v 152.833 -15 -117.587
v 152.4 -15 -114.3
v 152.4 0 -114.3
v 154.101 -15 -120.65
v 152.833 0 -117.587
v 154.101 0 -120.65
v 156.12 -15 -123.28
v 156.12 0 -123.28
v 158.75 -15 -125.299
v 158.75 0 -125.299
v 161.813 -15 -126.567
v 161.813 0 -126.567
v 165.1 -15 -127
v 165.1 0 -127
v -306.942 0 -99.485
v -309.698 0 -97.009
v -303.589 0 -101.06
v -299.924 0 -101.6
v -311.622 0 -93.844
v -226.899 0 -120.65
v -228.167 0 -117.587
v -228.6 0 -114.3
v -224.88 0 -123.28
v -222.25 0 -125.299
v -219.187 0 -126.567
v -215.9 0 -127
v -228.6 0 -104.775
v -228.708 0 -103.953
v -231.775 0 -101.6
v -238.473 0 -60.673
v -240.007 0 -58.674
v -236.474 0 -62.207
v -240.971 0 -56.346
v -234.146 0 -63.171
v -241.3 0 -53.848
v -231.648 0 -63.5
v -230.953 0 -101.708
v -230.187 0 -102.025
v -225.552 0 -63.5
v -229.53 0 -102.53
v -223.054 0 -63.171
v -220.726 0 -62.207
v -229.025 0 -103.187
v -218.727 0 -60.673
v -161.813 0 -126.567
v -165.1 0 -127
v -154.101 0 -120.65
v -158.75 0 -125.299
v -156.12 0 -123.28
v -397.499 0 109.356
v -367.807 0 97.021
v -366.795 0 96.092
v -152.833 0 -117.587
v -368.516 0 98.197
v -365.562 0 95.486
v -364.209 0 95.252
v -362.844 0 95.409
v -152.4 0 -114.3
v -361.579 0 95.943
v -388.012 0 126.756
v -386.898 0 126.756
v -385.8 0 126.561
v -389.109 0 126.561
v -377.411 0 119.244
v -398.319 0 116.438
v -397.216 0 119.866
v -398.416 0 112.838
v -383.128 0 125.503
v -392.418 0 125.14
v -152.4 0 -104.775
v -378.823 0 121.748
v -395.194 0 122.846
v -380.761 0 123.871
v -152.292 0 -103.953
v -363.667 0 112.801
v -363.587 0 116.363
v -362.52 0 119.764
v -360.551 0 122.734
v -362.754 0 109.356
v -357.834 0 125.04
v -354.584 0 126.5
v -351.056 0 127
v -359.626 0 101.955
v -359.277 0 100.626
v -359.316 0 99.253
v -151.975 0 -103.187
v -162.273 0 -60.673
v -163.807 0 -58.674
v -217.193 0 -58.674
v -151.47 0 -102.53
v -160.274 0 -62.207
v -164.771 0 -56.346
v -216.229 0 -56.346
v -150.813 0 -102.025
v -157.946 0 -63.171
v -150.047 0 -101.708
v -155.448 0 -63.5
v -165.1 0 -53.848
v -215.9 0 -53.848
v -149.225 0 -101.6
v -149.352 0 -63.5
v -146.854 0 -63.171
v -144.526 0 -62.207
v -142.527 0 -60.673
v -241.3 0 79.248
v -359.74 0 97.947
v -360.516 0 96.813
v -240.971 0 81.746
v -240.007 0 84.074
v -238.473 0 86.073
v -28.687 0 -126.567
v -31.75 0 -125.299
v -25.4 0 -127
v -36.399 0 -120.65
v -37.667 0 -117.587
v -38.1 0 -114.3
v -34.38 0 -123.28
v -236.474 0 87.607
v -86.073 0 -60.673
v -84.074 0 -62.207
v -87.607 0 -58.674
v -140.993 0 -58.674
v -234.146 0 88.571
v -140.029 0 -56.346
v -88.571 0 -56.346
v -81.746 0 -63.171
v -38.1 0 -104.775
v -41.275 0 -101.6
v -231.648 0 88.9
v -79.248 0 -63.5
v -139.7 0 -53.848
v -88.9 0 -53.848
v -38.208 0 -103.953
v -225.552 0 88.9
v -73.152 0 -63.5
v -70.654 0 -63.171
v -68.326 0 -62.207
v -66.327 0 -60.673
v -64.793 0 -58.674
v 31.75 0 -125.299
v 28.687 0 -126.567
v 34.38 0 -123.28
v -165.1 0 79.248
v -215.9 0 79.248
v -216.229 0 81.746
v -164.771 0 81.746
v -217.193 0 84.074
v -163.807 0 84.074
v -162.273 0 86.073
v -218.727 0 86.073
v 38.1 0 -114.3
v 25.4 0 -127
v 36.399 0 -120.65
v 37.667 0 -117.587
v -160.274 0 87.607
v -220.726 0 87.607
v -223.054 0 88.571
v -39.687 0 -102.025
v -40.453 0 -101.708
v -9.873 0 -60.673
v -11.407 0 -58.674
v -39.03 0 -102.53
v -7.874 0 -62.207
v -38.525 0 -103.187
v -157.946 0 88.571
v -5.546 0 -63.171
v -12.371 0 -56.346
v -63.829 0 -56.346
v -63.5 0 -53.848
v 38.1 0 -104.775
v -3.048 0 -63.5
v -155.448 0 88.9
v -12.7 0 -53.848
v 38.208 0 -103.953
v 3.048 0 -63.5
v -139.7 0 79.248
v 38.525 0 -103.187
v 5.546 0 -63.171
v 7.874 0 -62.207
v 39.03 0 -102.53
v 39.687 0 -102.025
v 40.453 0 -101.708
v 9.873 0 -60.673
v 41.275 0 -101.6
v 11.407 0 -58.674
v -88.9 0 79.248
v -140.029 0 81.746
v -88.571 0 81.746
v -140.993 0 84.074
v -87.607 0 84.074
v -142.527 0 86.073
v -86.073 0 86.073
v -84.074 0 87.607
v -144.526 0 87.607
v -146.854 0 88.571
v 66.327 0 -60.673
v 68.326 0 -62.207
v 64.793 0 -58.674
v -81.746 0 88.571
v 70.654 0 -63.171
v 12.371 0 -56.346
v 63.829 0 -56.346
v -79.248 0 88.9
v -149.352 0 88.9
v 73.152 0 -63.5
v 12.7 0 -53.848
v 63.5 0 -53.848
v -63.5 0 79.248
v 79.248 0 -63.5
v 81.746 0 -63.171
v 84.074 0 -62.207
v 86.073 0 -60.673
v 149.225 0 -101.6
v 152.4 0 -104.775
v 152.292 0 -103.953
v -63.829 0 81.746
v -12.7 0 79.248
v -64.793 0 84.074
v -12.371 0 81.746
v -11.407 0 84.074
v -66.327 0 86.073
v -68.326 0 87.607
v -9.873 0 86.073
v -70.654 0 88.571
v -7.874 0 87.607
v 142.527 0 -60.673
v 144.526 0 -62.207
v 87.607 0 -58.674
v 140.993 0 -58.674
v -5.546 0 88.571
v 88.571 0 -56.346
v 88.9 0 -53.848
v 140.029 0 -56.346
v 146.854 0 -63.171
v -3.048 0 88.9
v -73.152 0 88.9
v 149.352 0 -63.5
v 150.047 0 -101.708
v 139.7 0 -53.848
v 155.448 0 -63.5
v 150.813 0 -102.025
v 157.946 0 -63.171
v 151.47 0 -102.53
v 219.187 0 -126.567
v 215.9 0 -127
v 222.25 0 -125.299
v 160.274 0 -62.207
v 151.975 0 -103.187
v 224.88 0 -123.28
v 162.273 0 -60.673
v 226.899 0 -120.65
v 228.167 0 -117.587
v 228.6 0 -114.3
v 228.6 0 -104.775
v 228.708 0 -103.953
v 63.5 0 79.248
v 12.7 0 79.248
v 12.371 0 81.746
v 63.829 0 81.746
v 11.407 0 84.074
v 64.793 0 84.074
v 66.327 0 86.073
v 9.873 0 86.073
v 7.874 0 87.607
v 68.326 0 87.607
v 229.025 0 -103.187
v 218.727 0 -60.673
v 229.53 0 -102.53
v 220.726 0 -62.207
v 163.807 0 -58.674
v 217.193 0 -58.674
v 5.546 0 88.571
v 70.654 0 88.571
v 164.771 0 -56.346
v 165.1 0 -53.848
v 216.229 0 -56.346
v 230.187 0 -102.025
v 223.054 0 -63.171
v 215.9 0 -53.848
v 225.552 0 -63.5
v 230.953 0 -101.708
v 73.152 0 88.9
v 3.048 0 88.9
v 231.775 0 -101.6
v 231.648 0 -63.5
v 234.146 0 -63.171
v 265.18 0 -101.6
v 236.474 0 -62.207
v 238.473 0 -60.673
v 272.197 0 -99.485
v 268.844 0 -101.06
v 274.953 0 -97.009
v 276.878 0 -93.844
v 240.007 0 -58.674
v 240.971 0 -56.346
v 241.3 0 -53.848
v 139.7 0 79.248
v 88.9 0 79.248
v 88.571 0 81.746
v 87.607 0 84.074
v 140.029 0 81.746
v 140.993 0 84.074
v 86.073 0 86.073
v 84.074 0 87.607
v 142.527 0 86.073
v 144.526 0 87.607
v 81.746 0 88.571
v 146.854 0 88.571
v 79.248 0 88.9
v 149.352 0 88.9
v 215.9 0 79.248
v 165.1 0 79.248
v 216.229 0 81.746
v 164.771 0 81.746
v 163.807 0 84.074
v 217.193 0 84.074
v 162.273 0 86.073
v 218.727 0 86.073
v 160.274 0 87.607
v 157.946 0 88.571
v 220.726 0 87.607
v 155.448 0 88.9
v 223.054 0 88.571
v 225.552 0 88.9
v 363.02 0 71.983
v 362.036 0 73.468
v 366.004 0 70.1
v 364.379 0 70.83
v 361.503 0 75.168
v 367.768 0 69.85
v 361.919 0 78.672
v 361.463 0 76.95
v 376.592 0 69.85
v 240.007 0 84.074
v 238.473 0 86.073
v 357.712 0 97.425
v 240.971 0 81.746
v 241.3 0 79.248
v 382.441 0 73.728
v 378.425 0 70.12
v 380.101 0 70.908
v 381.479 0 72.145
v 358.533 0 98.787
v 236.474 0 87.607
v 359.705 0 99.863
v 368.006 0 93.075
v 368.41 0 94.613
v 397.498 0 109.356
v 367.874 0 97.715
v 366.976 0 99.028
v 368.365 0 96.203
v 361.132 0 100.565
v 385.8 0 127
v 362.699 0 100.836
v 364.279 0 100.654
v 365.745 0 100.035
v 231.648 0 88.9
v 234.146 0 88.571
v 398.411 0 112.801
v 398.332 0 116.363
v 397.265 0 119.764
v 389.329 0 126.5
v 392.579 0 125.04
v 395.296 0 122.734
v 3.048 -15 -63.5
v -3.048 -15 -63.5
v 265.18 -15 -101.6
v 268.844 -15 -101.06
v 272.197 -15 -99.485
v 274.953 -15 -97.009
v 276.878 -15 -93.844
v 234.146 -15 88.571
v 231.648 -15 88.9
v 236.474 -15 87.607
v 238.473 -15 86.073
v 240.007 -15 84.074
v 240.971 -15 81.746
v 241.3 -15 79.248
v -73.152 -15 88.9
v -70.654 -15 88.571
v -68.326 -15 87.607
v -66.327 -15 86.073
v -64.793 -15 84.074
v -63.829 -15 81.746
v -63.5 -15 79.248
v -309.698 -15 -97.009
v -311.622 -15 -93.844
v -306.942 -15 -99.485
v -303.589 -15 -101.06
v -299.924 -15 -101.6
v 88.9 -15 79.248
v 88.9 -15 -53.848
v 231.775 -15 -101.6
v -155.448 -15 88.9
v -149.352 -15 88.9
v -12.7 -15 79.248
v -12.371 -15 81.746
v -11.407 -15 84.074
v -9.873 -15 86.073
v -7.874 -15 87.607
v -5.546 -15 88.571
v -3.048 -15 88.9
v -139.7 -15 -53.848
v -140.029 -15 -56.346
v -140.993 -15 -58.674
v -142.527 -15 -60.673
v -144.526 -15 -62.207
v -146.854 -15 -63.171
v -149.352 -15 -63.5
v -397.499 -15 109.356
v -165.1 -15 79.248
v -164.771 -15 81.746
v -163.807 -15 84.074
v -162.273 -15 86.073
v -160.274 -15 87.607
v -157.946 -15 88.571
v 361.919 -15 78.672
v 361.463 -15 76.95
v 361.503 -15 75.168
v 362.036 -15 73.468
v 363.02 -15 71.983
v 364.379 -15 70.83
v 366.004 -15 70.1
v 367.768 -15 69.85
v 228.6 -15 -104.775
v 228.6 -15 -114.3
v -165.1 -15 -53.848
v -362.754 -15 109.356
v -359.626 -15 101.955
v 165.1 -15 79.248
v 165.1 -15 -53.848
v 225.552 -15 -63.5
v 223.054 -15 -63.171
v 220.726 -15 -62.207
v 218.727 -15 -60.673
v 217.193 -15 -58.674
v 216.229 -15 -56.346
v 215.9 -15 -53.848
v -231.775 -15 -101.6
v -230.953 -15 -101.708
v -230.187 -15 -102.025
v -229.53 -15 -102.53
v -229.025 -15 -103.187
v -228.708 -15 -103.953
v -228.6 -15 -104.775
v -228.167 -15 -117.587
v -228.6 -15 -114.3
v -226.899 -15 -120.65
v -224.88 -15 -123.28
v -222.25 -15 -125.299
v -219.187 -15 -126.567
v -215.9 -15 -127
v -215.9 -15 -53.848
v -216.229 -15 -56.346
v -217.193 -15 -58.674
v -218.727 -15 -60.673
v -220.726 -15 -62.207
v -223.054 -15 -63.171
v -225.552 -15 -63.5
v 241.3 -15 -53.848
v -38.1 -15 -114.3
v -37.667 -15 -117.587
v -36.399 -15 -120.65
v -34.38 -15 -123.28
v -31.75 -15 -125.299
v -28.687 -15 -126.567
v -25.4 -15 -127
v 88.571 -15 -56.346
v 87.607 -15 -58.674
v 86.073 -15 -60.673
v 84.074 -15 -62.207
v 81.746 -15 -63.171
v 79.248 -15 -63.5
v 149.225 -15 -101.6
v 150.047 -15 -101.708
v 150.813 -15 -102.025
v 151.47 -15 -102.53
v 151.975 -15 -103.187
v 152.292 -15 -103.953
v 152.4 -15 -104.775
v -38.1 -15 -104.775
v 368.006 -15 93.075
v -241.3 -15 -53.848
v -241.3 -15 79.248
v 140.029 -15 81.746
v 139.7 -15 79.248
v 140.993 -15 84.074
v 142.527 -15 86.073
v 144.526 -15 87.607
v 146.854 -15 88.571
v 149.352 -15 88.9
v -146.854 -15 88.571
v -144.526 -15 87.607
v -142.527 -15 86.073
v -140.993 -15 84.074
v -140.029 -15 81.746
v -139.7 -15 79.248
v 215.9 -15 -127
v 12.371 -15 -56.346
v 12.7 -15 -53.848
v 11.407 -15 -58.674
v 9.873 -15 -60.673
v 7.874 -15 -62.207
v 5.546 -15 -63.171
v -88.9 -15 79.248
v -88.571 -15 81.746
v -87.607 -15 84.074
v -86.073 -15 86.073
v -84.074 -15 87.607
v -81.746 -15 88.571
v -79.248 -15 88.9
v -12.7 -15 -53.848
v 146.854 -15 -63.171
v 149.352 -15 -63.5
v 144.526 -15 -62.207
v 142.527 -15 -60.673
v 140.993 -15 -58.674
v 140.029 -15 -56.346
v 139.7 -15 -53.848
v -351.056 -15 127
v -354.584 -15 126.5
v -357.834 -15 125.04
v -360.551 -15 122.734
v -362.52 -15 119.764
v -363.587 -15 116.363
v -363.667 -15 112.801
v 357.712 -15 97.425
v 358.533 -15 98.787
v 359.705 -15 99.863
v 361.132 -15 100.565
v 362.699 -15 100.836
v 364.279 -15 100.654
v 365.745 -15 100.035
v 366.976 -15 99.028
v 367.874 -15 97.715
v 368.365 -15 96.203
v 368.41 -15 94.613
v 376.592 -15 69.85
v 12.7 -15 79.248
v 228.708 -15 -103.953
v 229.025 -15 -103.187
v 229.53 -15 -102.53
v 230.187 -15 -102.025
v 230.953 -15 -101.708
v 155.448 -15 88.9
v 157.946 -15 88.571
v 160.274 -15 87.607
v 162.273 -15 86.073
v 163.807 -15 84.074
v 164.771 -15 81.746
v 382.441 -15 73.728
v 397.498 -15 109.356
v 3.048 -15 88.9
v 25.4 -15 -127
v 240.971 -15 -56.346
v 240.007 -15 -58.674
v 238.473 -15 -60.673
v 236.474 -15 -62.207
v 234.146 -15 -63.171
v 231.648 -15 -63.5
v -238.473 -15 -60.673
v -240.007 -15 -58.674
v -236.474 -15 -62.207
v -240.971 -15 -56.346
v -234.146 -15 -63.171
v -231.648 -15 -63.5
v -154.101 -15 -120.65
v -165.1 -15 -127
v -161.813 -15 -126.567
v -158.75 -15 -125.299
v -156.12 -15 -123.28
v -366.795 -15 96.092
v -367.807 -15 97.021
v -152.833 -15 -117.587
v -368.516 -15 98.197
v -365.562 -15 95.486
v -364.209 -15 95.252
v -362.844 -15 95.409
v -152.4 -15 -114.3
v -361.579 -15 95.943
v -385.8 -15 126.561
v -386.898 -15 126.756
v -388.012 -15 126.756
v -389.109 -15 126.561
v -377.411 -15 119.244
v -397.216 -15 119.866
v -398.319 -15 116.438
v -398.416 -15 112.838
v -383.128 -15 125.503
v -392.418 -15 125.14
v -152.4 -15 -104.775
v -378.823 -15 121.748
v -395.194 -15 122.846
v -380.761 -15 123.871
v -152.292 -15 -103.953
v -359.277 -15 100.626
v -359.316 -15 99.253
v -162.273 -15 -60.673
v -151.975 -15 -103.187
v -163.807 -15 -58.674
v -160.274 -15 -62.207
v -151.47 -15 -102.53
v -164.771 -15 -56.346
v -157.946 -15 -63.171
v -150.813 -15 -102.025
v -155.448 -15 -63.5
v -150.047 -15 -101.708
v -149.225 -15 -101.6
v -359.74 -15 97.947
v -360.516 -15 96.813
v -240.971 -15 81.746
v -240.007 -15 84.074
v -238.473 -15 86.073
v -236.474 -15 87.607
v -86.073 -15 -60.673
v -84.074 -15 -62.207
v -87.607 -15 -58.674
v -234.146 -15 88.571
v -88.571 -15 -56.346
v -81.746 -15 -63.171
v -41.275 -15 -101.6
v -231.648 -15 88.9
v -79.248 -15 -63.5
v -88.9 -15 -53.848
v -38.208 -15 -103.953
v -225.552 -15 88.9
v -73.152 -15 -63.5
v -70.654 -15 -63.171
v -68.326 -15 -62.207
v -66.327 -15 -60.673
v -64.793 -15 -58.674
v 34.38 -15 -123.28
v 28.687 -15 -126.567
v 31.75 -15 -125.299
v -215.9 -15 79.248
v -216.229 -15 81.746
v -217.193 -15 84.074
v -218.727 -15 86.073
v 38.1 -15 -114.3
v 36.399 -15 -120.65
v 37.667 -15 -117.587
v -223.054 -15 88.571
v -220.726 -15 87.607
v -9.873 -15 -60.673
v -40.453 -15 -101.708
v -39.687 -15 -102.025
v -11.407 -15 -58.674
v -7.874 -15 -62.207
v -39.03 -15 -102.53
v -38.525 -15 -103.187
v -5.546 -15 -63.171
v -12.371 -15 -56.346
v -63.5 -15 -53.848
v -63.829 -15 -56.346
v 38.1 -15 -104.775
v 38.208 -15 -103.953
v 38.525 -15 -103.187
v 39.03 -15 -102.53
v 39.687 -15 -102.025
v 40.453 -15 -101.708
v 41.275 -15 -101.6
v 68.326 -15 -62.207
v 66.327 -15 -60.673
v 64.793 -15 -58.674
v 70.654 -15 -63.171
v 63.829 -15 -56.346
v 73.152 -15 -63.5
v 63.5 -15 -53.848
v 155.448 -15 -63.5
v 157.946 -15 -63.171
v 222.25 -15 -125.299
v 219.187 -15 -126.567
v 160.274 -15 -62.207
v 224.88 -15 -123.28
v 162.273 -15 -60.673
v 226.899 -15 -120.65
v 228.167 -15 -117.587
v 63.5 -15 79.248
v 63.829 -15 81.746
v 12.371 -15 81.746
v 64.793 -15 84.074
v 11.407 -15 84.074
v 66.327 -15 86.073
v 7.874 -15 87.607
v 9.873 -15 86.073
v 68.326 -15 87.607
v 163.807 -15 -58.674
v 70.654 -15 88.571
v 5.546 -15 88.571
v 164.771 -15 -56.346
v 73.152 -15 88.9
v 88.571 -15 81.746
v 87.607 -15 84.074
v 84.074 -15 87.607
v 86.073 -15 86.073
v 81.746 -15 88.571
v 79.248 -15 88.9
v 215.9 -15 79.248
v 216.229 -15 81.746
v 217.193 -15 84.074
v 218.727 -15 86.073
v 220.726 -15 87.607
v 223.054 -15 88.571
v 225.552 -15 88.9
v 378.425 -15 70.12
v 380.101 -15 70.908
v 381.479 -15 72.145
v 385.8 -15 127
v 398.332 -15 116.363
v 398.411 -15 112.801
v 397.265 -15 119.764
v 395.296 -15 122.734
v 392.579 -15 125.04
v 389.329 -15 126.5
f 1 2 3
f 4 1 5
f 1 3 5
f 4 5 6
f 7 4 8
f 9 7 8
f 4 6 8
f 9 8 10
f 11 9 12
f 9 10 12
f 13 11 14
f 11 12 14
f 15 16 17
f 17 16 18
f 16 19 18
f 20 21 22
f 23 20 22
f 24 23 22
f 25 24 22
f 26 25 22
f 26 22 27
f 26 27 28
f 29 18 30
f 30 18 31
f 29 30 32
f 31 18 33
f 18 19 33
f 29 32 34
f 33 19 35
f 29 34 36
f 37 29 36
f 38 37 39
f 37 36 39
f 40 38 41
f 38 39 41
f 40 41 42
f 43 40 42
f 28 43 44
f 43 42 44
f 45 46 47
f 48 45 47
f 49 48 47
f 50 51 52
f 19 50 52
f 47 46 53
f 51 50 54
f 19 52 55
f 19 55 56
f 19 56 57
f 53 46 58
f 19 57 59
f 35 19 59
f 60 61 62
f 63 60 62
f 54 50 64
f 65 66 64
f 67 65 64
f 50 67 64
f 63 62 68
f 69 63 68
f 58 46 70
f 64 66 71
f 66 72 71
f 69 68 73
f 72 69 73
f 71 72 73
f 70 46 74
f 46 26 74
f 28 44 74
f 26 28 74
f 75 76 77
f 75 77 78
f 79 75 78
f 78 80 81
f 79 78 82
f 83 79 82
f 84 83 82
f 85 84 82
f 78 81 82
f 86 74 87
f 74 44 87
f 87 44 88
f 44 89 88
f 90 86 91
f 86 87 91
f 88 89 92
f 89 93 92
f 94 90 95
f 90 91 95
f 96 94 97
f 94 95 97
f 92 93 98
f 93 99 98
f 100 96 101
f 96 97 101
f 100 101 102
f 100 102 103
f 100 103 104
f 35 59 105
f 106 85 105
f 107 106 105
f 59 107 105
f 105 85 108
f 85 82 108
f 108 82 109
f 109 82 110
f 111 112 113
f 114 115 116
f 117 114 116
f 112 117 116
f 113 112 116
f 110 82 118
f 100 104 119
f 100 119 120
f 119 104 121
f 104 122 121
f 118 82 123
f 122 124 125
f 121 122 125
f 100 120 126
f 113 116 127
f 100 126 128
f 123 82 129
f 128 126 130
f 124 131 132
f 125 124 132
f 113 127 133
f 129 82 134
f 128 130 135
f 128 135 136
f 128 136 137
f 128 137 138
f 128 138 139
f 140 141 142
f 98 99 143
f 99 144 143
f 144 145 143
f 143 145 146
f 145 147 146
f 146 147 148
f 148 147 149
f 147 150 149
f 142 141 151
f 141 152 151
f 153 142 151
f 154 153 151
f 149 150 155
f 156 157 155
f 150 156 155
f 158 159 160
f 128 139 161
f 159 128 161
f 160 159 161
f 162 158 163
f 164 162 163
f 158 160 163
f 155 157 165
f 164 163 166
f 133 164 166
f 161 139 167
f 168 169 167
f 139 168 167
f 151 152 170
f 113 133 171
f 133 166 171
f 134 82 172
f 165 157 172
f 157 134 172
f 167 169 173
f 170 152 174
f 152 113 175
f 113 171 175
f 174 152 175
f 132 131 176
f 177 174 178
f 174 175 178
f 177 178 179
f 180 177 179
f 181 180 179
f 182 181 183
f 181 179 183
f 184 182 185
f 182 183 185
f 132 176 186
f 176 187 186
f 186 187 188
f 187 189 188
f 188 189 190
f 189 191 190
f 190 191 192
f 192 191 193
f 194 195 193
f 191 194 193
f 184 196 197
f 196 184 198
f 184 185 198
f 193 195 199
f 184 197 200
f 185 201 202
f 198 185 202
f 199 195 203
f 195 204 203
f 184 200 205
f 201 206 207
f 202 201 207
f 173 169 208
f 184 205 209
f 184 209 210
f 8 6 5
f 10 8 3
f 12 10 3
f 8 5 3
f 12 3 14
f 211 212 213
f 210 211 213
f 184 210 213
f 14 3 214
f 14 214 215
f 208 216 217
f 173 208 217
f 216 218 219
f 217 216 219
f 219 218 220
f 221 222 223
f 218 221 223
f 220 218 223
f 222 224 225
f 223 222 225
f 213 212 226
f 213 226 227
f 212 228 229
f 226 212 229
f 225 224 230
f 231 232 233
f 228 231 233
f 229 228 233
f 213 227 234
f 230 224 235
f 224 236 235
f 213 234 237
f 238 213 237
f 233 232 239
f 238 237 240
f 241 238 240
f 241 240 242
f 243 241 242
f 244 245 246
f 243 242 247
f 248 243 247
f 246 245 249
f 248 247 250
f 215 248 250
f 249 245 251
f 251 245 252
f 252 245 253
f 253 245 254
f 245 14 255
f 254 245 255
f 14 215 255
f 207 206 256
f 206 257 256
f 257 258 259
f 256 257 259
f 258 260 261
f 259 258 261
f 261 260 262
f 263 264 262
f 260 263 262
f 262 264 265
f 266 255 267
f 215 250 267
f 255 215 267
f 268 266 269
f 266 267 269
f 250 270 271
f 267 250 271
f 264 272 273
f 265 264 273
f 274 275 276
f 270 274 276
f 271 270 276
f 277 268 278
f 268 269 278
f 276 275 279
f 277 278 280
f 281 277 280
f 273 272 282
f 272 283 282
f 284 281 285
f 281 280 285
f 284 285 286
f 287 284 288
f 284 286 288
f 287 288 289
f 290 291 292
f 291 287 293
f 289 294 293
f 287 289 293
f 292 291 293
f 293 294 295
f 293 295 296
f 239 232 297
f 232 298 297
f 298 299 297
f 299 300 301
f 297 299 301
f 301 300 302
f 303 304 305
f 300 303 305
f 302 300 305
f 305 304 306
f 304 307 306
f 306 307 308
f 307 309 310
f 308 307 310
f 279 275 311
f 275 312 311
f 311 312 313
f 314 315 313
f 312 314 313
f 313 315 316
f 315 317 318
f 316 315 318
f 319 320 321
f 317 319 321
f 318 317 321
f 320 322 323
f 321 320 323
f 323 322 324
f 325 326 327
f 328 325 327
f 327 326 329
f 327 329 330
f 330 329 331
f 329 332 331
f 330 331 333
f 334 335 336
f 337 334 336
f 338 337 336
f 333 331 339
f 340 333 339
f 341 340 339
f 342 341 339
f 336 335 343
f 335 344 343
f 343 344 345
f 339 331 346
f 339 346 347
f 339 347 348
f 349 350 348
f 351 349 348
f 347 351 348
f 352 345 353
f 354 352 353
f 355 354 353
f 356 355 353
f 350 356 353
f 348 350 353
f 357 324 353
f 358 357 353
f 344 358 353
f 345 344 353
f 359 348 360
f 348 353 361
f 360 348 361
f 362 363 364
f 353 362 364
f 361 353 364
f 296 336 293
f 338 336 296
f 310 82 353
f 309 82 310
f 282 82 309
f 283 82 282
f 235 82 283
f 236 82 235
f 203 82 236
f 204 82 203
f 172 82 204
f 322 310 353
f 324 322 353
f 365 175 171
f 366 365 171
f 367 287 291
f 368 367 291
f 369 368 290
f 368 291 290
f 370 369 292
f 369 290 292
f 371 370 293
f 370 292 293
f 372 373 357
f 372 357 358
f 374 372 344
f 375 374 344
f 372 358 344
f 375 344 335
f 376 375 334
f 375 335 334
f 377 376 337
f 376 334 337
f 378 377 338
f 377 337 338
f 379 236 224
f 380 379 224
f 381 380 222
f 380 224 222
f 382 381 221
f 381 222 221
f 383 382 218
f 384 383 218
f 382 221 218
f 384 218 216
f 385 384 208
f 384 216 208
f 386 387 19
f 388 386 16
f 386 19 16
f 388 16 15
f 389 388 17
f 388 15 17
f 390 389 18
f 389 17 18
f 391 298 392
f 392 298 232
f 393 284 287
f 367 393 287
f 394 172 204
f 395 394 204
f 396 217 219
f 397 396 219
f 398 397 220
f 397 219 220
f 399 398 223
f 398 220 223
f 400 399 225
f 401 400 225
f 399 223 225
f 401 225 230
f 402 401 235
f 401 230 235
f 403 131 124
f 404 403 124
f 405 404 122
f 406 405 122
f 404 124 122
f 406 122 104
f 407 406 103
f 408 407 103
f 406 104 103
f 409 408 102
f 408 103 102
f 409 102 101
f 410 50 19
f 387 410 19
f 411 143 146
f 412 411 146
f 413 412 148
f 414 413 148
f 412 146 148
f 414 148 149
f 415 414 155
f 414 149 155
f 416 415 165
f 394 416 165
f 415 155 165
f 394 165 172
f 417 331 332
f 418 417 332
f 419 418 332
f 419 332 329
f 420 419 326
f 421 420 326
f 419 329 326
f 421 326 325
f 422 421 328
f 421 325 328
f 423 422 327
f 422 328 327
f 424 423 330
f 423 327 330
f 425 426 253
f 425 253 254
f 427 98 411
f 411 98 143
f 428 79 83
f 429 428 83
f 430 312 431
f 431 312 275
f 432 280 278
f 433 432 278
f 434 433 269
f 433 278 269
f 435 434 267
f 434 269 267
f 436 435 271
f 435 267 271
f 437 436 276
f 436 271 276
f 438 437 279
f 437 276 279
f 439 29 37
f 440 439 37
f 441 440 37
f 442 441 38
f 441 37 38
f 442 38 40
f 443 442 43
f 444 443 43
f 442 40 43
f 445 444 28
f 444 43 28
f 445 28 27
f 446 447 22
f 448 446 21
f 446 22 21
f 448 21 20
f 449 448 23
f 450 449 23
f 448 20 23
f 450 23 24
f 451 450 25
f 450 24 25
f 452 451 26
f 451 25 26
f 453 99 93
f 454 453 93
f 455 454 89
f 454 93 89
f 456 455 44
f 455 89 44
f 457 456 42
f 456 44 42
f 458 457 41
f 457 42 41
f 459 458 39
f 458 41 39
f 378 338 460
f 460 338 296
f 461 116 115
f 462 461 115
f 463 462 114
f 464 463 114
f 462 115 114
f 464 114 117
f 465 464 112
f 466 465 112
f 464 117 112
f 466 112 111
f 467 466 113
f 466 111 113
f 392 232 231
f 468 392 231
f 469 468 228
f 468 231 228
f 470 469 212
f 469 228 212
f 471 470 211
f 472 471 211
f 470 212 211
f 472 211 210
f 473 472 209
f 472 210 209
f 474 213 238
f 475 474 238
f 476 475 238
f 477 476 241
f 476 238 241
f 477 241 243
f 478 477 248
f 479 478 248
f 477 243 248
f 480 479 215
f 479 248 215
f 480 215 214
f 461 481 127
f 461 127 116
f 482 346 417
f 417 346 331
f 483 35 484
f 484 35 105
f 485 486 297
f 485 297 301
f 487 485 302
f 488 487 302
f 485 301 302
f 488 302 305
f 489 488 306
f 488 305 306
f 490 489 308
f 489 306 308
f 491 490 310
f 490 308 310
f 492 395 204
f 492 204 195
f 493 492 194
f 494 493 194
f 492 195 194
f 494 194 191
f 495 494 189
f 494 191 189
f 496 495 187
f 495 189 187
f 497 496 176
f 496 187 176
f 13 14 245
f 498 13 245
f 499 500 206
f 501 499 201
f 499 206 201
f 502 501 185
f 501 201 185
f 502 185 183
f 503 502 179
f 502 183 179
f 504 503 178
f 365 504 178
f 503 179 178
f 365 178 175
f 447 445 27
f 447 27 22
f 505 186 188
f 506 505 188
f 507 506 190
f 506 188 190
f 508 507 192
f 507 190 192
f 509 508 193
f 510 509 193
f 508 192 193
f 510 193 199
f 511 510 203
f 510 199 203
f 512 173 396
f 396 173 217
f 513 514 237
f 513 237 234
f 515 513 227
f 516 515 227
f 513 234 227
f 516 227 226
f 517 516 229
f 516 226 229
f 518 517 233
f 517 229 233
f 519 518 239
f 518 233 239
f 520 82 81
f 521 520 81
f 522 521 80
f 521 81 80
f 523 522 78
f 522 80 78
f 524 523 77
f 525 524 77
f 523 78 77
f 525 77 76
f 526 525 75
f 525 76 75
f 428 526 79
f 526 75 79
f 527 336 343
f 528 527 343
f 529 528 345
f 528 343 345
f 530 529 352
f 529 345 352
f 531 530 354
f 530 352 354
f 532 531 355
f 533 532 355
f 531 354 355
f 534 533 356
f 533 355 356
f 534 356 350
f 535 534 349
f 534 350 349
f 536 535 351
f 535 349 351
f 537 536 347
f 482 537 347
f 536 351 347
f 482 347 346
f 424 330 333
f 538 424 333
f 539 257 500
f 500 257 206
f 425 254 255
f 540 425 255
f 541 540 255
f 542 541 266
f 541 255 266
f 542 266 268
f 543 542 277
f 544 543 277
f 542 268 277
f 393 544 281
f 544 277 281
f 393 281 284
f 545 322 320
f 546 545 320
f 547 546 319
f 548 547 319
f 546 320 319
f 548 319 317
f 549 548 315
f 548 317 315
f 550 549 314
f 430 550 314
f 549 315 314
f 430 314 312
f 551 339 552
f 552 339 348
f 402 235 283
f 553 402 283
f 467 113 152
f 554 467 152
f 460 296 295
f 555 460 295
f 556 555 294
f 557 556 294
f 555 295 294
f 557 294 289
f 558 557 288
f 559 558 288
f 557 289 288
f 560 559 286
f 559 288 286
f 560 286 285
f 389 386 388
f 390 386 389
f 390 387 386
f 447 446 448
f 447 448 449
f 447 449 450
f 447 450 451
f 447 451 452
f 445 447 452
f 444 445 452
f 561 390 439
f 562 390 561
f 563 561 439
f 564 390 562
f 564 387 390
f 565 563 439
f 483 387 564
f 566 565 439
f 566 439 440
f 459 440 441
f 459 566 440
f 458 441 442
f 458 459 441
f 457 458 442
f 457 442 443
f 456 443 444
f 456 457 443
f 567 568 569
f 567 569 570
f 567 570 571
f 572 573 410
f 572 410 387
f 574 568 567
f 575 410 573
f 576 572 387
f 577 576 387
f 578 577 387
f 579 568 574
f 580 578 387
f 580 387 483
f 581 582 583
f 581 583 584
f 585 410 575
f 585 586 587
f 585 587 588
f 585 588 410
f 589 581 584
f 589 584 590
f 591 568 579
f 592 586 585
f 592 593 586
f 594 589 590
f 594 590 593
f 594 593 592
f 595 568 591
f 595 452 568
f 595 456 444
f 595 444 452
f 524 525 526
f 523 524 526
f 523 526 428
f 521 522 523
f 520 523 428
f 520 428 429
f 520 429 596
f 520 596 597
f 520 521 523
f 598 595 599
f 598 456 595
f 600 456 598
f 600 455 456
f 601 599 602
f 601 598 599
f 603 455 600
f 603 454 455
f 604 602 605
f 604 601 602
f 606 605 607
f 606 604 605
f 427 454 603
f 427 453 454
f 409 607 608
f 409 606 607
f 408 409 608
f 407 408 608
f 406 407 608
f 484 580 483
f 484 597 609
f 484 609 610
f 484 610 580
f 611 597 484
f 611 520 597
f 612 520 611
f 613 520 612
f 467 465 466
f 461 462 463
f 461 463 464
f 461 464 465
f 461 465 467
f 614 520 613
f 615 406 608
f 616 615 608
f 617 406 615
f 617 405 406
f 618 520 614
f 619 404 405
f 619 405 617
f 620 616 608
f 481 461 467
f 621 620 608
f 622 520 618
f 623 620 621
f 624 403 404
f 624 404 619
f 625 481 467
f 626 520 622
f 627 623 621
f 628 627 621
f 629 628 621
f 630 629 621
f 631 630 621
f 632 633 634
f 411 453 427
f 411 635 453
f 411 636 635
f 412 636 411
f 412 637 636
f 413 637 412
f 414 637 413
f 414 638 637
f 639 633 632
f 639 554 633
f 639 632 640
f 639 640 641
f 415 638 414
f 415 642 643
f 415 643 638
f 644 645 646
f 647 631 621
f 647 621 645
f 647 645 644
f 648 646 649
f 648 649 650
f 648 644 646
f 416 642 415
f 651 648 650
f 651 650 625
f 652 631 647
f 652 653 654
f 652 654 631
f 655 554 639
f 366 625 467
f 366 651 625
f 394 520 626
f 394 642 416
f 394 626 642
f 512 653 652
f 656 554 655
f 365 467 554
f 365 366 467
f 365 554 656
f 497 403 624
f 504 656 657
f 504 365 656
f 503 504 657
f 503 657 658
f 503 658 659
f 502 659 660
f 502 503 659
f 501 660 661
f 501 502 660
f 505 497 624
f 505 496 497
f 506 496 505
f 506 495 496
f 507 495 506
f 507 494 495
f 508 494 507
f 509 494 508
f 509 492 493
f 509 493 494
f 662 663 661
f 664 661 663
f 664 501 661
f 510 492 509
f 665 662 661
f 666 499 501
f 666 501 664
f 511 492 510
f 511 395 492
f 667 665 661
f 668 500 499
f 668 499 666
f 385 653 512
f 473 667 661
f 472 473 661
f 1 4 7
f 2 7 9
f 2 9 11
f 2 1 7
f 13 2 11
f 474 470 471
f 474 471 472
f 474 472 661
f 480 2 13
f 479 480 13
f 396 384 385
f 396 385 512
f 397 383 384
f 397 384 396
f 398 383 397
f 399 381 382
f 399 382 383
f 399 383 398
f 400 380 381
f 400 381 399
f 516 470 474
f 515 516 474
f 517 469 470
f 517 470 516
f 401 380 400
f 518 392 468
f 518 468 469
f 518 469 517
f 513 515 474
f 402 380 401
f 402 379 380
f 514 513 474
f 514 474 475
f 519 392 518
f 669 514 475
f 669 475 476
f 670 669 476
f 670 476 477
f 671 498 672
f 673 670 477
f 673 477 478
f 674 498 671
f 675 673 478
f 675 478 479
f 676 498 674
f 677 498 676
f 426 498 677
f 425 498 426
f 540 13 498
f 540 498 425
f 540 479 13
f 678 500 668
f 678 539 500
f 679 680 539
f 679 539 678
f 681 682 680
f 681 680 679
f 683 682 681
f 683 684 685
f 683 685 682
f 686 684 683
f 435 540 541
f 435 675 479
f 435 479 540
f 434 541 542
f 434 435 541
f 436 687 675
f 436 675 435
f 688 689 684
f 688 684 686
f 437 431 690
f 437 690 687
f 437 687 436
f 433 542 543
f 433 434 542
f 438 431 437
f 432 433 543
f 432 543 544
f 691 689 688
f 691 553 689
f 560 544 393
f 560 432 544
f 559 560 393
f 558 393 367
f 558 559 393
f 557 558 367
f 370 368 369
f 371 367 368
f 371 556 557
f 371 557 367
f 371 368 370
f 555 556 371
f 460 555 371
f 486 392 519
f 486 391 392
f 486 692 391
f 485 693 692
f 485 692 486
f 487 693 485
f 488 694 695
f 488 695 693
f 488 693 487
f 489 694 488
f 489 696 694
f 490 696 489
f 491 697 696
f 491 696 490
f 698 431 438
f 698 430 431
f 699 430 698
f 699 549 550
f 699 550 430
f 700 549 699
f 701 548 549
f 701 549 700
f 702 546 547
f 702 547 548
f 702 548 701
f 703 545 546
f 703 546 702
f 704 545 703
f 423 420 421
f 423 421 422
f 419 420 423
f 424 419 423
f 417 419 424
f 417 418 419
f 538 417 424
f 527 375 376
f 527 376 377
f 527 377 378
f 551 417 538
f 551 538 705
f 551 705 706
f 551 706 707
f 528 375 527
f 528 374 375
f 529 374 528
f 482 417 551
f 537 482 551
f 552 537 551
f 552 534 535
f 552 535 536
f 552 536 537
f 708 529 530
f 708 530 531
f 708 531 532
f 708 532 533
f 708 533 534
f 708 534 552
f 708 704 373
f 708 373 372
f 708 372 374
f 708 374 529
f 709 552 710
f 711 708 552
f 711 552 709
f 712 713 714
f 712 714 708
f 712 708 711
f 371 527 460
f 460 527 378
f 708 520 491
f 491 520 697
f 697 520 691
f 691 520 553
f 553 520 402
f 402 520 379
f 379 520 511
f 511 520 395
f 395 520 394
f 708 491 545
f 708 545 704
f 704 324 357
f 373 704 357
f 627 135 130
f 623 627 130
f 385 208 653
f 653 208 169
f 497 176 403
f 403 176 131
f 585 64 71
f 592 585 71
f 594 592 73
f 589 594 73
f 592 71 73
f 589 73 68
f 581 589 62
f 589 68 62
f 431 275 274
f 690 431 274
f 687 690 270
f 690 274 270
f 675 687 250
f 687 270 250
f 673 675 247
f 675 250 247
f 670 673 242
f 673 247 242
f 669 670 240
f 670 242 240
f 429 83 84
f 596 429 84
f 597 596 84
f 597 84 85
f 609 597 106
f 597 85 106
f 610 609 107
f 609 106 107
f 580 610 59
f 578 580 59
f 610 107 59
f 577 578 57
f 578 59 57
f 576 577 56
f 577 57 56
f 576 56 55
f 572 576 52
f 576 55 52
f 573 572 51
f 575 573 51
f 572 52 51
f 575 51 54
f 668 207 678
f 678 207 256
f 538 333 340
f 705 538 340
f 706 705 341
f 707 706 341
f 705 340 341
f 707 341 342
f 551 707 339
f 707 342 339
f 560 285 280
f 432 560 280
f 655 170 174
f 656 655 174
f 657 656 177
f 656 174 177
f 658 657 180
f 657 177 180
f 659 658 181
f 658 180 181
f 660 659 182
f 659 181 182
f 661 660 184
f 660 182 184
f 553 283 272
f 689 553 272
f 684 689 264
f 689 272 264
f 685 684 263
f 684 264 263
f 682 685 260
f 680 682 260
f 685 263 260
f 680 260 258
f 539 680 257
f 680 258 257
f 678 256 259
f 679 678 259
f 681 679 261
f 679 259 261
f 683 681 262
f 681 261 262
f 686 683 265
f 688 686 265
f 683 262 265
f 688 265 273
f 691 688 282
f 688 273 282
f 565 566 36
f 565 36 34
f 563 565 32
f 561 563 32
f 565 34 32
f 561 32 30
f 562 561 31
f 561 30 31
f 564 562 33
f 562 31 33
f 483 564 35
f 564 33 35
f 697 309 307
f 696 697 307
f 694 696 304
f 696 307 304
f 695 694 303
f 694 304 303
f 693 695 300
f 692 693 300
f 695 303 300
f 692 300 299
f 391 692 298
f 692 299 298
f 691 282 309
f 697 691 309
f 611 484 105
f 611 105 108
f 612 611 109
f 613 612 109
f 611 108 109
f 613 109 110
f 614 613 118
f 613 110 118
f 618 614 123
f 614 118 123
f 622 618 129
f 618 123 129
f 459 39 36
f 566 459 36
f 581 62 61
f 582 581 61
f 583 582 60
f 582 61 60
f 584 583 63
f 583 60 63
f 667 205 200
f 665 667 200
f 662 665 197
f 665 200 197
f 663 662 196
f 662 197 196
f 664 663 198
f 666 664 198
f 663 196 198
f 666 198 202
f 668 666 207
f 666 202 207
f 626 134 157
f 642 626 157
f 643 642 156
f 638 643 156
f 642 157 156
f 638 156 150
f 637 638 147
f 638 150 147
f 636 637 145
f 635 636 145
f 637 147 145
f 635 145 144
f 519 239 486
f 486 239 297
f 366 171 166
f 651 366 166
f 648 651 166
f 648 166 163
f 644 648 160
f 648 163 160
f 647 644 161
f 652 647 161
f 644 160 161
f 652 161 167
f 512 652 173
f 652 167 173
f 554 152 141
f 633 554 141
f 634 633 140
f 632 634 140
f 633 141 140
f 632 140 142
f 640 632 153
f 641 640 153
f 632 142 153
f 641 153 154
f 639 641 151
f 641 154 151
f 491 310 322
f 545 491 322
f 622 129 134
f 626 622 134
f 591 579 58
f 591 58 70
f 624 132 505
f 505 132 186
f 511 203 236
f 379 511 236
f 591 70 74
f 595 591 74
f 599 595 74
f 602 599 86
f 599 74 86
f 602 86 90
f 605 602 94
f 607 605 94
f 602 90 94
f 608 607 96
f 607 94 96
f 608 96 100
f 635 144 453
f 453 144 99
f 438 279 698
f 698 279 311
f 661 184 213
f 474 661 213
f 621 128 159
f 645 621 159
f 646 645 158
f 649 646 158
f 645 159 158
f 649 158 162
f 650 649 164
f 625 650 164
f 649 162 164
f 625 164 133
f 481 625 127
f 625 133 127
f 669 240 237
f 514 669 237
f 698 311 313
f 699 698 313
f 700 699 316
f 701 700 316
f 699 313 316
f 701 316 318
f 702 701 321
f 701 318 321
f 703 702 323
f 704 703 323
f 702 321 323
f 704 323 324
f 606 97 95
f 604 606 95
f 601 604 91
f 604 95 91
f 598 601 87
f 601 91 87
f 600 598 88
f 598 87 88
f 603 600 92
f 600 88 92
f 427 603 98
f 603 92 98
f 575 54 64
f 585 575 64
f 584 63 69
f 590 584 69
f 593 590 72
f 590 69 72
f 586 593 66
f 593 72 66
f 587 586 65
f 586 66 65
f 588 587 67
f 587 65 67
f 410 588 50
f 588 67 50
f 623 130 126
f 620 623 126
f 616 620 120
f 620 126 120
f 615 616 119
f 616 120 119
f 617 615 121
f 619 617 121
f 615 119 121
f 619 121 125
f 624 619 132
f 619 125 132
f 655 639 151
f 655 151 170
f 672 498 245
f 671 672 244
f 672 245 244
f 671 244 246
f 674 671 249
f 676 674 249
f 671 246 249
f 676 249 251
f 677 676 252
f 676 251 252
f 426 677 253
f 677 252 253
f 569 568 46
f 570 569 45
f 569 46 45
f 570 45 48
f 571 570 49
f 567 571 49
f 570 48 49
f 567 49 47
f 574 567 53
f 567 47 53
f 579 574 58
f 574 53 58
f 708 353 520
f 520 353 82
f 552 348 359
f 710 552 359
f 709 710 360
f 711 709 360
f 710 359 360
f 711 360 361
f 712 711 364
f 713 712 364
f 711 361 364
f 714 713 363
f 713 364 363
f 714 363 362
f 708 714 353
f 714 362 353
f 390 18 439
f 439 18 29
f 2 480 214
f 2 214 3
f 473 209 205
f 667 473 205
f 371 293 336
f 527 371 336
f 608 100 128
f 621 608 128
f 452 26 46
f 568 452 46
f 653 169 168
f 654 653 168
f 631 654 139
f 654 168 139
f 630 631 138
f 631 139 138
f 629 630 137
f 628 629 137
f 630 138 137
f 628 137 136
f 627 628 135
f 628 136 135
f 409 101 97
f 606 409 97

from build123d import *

# Parameters (mm, degrees)
F1_DEPTH = 15


# Not quite as in the source:
# - ends of sketch curves that miss each other by under 0.0002 mm in the source are joined


with BuildPart() as f1:
    # F0 (on Front) → F1 (new body)
    with BuildSketch(Plane.XZ):
        with BuildLine():
            Line((152.4, -104.775), (152.4, -114.3))
            ThreePointArc((152.4, -114.3), (156.1197438789, -123.2802561211), (165.1, -127))
            Line((165.1, -127), (215.9, -127))
            ThreePointArc((215.9, -127), (224.8802561211, -123.2802561211), (228.6, -114.3))
            Line((228.6, -114.3), (228.6, -104.775))
            ThreePointArc((228.6, -104.775), (229.5299359697, -102.5299359697), (231.775, -101.6))
            Line((231.775, -101.6), (265.179556, -101.6))
            ThreePointArc((265.179556, -101.6), (272.1974896575, -99.4848291048), (276.8777652022, -93.8438751462))
            Line((276.8777652022, -93.8438751462), (357.711629, 97.4253068))
            ThreePointArc((357.711629, 97.4253068), (365.0341452454, 100.3972108736), (368.0060482736, 93.0746921546))
            Line((368.0060482736, 93.0746921546), (361.9191644, 78.6719534))
            ThreePointArc((361.9191644, 78.6719534), (362.4758586154, 72.6910380462), (367.7682764, 69.85))
            Line((367.7682764, 69.85), (376.592338, 69.85))
            ThreePointArc((376.592338, 69.85), (380.1013055832, 70.9075859478), (382.4414433059, 73.7280640946))
            Line((382.4414433059, 73.7280640946), (397.4984938, 109.3561186))
            ThreePointArc((397.4984938, 109.3561186), (396.3851270368, 121.3179295371), (385.8002952, 127))
            Line((385.8002952, 127), (-351.0556098, 127))
            ThreePointArc((-351.0556098, 127), (-361.6404416368, 121.3179295371), (-362.7538151531, 109.356115746))
            Line((-362.7538151531, 109.356115746), (-359.6258238, 101.9546856))
            ThreePointArc((-359.6258238, 101.9546856), (-362.1924804362, 95.6306809293), (-368.5164757001, 98.1973326577))
            Line((-368.5164757001, 98.1973326577), (-377.411107, 119.2438814))
            ThreePointArc((-377.411107, 119.2438814), (-380.76124871, 123.8707639235), (-385.8003211895, 126.5613398156))
            ThreePointArc((-385.8003211895, 126.5613398156), (-387.4548258, 126.780671), (-389.1093307052, 126.5613409078))
            ThreePointArc((-389.1093307052, 126.5613409078), (-397.2156200075, 119.8660524106), (-397.4985259531, 109.356115746))
            Line((-397.4985259531, 109.356115746), (-311.6224908, -93.8438814))
            ThreePointArc((-311.6224908, -93.8438814), (-306.9422004575, -99.4848291048), (-299.9242668, -101.6))
            Line((-299.9242668, -101.6), (-231.775, -101.6))
            ThreePointArc((-231.775, -101.6), (-229.5299359697, -102.5299359697), (-228.6, -104.775))
            Line((-228.6, -104.775), (-228.6, -114.3))
            ThreePointArc((-228.6, -114.3), (-224.8802561211, -123.2802561211), (-215.9, -127))
            Line((-215.9, -127), (-165.1, -127))
            ThreePointArc((-165.1, -127), (-156.1197438789, -123.2802561211), (-152.4, -114.3))
            Line((-152.4, -114.3), (-152.4, -104.775))
            ThreePointArc((-152.4, -104.775), (-151.4700640303, -102.5299359697), (-149.225, -101.6))
            Line((-149.225, -101.6), (-41.275, -101.6))
            ThreePointArc((-41.275, -101.6), (-39.0299359697, -102.5299359697), (-38.1, -104.775))
            Line((-38.1, -104.775), (-38.1, -114.3))
            ThreePointArc((-38.1, -114.3), (-34.3802561211, -123.2802561211), (-25.4, -127))
            Line((-25.4, -127), (25.4, -127))
            ThreePointArc((25.4, -127), (34.3802561211, -123.2802561211), (38.1, -114.3))
            Line((38.1, -114.3), (38.1, -104.775))
            ThreePointArc((38.1, -104.775), (39.0299359697, -102.5299359697), (41.275, -101.6))
            Line((41.275, -101.6), (149.225, -101.6))
            ThreePointArc((149.225, -101.6), (151.4700640303, -102.5299359697), (152.4, -104.775))
        make_face()
        with BuildLine():
            ThreePointArc((-215.9, -53.848), (-218.727005348, -60.672994652), (-225.552, -63.5))
            Line((-225.552, -63.5), (-231.648, -63.5))
            ThreePointArc((-231.648, -63.5), (-238.472994652, -60.672994652), (-241.3, -53.848))
            Line((-241.3, -53.848), (-241.3, 79.248))
            ThreePointArc((-241.3, 79.248), (-238.472994652, 86.072994652), (-231.648, 88.9))
            Line((-231.648, 88.9), (-225.552, 88.9))
            ThreePointArc((-225.552, 88.9), (-218.727005348, 86.072994652), (-215.9, 79.248))
            Line((-215.9, 79.248), (-215.9, -53.848))
        make_face(mode=Mode.SUBTRACT)
        with BuildLine():
            ThreePointArc((-139.7, -53.848), (-142.527005348, -60.672994652), (-149.352, -63.5))
            Line((-149.352, -63.5), (-155.448, -63.5))
            ThreePointArc((-155.448, -63.5), (-162.272994652, -60.672994652), (-165.1, -53.848))
            Line((-165.1, -53.848), (-165.1, 79.248))
            ThreePointArc((-165.1, 79.248), (-162.272994652, 86.072994652), (-155.448, 88.9))
            Line((-155.448, 88.9), (-149.352, 88.9))
            ThreePointArc((-149.352, 88.9), (-142.527005348, 86.072994652), (-139.7, 79.248))
            Line((-139.7, 79.248), (-139.7, -53.848))
        make_face(mode=Mode.SUBTRACT)
        with BuildLine():
            ThreePointArc((-63.5, -53.848), (-66.327005348, -60.672994652), (-73.152, -63.5))
            Line((-73.152, -63.5), (-79.248, -63.5))
            ThreePointArc((-79.248, -63.5), (-86.072994652, -60.672994652), (-88.9, -53.848))
            Line((-88.9, -53.848), (-88.9, 79.248))
            ThreePointArc((-88.9, 79.248), (-86.072994652, 86.072994652), (-79.248, 88.9))
            Line((-79.248, 88.9), (-73.152, 88.9))
            ThreePointArc((-73.152, 88.9), (-66.327005348, 86.072994652), (-63.5, 79.248))
            Line((-63.5, 79.248), (-63.5, -53.848))
        make_face(mode=Mode.SUBTRACT)
        with BuildLine():
            ThreePointArc((12.7, -53.848), (9.872994652, -60.672994652), (3.048, -63.5))
            Line((3.048, -63.5), (-3.048, -63.5))
            ThreePointArc((-3.048, -63.5), (-9.872994652, -60.672994652), (-12.7, -53.848))
            Line((-12.7, -53.848), (-12.7, 79.248))
            ThreePointArc((-12.7, 79.248), (-9.872994652, 86.072994652), (-3.048, 88.9))
            Line((-3.048, 88.9), (3.048, 88.9))
            ThreePointArc((3.048, 88.9), (9.872994652, 86.072994652), (12.7, 79.248))
            Line((12.7, 79.248), (12.7, -53.848))
        make_face(mode=Mode.SUBTRACT)
        with BuildLine():
            ThreePointArc((88.9, -53.848), (86.072994652, -60.672994652), (79.248, -63.5))
            Line((79.248, -63.5), (73.152, -63.5))
            ThreePointArc((73.152, -63.5), (66.327005348, -60.672994652), (63.5, -53.848))
            Line((63.5, -53.848), (63.5, 79.248))
            ThreePointArc((63.5, 79.248), (66.327005348, 86.072994652), (73.152, 88.9))
            Line((73.152, 88.9), (79.248, 88.9))
            ThreePointArc((79.248, 88.9), (86.072994652, 86.072994652), (88.9, 79.248))
            Line((88.9, 79.248), (88.9, -53.848))
        make_face(mode=Mode.SUBTRACT)
        with BuildLine():
            ThreePointArc((165.1, -53.848), (162.272994652, -60.672994652), (155.448, -63.5))
            Line((155.448, -63.5), (149.352, -63.5))
            ThreePointArc((149.352, -63.5), (142.527005348, -60.672994652), (139.7, -53.848))
            Line((139.7, -53.848), (139.7, 79.248))
            ThreePointArc((139.7, 79.248), (142.527005348, 86.072994652), (149.352, 88.9))
            Line((149.352, 88.9), (155.448, 88.9))
            ThreePointArc((155.448, 88.9), (162.272994652, 86.072994652), (165.1, 79.248))
            Line((165.1, 79.248), (165.1, -53.848))
        make_face(mode=Mode.SUBTRACT)
        with BuildLine():
            ThreePointArc((241.3, -53.848), (238.472994652, -60.672994652), (231.648, -63.5))
            Line((231.648, -63.5), (225.552, -63.5))
            ThreePointArc((225.552, -63.5), (218.727005348, -60.672994652), (215.9, -53.848))
            Line((215.9, -53.848), (215.9, 79.248))
            ThreePointArc((215.9, 79.248), (218.727005348, 86.072994652), (225.552, 88.9))
            Line((225.552, 88.9), (231.648, 88.9))
            ThreePointArc((231.648, 88.9), (238.472994652, 86.072994652), (241.3, 79.248))
            Line((241.3, 79.248), (241.3, -53.848))
        make_face(mode=Mode.SUBTRACT)
    extrude(amount=F1_DEPTH)


solid = f1.part
